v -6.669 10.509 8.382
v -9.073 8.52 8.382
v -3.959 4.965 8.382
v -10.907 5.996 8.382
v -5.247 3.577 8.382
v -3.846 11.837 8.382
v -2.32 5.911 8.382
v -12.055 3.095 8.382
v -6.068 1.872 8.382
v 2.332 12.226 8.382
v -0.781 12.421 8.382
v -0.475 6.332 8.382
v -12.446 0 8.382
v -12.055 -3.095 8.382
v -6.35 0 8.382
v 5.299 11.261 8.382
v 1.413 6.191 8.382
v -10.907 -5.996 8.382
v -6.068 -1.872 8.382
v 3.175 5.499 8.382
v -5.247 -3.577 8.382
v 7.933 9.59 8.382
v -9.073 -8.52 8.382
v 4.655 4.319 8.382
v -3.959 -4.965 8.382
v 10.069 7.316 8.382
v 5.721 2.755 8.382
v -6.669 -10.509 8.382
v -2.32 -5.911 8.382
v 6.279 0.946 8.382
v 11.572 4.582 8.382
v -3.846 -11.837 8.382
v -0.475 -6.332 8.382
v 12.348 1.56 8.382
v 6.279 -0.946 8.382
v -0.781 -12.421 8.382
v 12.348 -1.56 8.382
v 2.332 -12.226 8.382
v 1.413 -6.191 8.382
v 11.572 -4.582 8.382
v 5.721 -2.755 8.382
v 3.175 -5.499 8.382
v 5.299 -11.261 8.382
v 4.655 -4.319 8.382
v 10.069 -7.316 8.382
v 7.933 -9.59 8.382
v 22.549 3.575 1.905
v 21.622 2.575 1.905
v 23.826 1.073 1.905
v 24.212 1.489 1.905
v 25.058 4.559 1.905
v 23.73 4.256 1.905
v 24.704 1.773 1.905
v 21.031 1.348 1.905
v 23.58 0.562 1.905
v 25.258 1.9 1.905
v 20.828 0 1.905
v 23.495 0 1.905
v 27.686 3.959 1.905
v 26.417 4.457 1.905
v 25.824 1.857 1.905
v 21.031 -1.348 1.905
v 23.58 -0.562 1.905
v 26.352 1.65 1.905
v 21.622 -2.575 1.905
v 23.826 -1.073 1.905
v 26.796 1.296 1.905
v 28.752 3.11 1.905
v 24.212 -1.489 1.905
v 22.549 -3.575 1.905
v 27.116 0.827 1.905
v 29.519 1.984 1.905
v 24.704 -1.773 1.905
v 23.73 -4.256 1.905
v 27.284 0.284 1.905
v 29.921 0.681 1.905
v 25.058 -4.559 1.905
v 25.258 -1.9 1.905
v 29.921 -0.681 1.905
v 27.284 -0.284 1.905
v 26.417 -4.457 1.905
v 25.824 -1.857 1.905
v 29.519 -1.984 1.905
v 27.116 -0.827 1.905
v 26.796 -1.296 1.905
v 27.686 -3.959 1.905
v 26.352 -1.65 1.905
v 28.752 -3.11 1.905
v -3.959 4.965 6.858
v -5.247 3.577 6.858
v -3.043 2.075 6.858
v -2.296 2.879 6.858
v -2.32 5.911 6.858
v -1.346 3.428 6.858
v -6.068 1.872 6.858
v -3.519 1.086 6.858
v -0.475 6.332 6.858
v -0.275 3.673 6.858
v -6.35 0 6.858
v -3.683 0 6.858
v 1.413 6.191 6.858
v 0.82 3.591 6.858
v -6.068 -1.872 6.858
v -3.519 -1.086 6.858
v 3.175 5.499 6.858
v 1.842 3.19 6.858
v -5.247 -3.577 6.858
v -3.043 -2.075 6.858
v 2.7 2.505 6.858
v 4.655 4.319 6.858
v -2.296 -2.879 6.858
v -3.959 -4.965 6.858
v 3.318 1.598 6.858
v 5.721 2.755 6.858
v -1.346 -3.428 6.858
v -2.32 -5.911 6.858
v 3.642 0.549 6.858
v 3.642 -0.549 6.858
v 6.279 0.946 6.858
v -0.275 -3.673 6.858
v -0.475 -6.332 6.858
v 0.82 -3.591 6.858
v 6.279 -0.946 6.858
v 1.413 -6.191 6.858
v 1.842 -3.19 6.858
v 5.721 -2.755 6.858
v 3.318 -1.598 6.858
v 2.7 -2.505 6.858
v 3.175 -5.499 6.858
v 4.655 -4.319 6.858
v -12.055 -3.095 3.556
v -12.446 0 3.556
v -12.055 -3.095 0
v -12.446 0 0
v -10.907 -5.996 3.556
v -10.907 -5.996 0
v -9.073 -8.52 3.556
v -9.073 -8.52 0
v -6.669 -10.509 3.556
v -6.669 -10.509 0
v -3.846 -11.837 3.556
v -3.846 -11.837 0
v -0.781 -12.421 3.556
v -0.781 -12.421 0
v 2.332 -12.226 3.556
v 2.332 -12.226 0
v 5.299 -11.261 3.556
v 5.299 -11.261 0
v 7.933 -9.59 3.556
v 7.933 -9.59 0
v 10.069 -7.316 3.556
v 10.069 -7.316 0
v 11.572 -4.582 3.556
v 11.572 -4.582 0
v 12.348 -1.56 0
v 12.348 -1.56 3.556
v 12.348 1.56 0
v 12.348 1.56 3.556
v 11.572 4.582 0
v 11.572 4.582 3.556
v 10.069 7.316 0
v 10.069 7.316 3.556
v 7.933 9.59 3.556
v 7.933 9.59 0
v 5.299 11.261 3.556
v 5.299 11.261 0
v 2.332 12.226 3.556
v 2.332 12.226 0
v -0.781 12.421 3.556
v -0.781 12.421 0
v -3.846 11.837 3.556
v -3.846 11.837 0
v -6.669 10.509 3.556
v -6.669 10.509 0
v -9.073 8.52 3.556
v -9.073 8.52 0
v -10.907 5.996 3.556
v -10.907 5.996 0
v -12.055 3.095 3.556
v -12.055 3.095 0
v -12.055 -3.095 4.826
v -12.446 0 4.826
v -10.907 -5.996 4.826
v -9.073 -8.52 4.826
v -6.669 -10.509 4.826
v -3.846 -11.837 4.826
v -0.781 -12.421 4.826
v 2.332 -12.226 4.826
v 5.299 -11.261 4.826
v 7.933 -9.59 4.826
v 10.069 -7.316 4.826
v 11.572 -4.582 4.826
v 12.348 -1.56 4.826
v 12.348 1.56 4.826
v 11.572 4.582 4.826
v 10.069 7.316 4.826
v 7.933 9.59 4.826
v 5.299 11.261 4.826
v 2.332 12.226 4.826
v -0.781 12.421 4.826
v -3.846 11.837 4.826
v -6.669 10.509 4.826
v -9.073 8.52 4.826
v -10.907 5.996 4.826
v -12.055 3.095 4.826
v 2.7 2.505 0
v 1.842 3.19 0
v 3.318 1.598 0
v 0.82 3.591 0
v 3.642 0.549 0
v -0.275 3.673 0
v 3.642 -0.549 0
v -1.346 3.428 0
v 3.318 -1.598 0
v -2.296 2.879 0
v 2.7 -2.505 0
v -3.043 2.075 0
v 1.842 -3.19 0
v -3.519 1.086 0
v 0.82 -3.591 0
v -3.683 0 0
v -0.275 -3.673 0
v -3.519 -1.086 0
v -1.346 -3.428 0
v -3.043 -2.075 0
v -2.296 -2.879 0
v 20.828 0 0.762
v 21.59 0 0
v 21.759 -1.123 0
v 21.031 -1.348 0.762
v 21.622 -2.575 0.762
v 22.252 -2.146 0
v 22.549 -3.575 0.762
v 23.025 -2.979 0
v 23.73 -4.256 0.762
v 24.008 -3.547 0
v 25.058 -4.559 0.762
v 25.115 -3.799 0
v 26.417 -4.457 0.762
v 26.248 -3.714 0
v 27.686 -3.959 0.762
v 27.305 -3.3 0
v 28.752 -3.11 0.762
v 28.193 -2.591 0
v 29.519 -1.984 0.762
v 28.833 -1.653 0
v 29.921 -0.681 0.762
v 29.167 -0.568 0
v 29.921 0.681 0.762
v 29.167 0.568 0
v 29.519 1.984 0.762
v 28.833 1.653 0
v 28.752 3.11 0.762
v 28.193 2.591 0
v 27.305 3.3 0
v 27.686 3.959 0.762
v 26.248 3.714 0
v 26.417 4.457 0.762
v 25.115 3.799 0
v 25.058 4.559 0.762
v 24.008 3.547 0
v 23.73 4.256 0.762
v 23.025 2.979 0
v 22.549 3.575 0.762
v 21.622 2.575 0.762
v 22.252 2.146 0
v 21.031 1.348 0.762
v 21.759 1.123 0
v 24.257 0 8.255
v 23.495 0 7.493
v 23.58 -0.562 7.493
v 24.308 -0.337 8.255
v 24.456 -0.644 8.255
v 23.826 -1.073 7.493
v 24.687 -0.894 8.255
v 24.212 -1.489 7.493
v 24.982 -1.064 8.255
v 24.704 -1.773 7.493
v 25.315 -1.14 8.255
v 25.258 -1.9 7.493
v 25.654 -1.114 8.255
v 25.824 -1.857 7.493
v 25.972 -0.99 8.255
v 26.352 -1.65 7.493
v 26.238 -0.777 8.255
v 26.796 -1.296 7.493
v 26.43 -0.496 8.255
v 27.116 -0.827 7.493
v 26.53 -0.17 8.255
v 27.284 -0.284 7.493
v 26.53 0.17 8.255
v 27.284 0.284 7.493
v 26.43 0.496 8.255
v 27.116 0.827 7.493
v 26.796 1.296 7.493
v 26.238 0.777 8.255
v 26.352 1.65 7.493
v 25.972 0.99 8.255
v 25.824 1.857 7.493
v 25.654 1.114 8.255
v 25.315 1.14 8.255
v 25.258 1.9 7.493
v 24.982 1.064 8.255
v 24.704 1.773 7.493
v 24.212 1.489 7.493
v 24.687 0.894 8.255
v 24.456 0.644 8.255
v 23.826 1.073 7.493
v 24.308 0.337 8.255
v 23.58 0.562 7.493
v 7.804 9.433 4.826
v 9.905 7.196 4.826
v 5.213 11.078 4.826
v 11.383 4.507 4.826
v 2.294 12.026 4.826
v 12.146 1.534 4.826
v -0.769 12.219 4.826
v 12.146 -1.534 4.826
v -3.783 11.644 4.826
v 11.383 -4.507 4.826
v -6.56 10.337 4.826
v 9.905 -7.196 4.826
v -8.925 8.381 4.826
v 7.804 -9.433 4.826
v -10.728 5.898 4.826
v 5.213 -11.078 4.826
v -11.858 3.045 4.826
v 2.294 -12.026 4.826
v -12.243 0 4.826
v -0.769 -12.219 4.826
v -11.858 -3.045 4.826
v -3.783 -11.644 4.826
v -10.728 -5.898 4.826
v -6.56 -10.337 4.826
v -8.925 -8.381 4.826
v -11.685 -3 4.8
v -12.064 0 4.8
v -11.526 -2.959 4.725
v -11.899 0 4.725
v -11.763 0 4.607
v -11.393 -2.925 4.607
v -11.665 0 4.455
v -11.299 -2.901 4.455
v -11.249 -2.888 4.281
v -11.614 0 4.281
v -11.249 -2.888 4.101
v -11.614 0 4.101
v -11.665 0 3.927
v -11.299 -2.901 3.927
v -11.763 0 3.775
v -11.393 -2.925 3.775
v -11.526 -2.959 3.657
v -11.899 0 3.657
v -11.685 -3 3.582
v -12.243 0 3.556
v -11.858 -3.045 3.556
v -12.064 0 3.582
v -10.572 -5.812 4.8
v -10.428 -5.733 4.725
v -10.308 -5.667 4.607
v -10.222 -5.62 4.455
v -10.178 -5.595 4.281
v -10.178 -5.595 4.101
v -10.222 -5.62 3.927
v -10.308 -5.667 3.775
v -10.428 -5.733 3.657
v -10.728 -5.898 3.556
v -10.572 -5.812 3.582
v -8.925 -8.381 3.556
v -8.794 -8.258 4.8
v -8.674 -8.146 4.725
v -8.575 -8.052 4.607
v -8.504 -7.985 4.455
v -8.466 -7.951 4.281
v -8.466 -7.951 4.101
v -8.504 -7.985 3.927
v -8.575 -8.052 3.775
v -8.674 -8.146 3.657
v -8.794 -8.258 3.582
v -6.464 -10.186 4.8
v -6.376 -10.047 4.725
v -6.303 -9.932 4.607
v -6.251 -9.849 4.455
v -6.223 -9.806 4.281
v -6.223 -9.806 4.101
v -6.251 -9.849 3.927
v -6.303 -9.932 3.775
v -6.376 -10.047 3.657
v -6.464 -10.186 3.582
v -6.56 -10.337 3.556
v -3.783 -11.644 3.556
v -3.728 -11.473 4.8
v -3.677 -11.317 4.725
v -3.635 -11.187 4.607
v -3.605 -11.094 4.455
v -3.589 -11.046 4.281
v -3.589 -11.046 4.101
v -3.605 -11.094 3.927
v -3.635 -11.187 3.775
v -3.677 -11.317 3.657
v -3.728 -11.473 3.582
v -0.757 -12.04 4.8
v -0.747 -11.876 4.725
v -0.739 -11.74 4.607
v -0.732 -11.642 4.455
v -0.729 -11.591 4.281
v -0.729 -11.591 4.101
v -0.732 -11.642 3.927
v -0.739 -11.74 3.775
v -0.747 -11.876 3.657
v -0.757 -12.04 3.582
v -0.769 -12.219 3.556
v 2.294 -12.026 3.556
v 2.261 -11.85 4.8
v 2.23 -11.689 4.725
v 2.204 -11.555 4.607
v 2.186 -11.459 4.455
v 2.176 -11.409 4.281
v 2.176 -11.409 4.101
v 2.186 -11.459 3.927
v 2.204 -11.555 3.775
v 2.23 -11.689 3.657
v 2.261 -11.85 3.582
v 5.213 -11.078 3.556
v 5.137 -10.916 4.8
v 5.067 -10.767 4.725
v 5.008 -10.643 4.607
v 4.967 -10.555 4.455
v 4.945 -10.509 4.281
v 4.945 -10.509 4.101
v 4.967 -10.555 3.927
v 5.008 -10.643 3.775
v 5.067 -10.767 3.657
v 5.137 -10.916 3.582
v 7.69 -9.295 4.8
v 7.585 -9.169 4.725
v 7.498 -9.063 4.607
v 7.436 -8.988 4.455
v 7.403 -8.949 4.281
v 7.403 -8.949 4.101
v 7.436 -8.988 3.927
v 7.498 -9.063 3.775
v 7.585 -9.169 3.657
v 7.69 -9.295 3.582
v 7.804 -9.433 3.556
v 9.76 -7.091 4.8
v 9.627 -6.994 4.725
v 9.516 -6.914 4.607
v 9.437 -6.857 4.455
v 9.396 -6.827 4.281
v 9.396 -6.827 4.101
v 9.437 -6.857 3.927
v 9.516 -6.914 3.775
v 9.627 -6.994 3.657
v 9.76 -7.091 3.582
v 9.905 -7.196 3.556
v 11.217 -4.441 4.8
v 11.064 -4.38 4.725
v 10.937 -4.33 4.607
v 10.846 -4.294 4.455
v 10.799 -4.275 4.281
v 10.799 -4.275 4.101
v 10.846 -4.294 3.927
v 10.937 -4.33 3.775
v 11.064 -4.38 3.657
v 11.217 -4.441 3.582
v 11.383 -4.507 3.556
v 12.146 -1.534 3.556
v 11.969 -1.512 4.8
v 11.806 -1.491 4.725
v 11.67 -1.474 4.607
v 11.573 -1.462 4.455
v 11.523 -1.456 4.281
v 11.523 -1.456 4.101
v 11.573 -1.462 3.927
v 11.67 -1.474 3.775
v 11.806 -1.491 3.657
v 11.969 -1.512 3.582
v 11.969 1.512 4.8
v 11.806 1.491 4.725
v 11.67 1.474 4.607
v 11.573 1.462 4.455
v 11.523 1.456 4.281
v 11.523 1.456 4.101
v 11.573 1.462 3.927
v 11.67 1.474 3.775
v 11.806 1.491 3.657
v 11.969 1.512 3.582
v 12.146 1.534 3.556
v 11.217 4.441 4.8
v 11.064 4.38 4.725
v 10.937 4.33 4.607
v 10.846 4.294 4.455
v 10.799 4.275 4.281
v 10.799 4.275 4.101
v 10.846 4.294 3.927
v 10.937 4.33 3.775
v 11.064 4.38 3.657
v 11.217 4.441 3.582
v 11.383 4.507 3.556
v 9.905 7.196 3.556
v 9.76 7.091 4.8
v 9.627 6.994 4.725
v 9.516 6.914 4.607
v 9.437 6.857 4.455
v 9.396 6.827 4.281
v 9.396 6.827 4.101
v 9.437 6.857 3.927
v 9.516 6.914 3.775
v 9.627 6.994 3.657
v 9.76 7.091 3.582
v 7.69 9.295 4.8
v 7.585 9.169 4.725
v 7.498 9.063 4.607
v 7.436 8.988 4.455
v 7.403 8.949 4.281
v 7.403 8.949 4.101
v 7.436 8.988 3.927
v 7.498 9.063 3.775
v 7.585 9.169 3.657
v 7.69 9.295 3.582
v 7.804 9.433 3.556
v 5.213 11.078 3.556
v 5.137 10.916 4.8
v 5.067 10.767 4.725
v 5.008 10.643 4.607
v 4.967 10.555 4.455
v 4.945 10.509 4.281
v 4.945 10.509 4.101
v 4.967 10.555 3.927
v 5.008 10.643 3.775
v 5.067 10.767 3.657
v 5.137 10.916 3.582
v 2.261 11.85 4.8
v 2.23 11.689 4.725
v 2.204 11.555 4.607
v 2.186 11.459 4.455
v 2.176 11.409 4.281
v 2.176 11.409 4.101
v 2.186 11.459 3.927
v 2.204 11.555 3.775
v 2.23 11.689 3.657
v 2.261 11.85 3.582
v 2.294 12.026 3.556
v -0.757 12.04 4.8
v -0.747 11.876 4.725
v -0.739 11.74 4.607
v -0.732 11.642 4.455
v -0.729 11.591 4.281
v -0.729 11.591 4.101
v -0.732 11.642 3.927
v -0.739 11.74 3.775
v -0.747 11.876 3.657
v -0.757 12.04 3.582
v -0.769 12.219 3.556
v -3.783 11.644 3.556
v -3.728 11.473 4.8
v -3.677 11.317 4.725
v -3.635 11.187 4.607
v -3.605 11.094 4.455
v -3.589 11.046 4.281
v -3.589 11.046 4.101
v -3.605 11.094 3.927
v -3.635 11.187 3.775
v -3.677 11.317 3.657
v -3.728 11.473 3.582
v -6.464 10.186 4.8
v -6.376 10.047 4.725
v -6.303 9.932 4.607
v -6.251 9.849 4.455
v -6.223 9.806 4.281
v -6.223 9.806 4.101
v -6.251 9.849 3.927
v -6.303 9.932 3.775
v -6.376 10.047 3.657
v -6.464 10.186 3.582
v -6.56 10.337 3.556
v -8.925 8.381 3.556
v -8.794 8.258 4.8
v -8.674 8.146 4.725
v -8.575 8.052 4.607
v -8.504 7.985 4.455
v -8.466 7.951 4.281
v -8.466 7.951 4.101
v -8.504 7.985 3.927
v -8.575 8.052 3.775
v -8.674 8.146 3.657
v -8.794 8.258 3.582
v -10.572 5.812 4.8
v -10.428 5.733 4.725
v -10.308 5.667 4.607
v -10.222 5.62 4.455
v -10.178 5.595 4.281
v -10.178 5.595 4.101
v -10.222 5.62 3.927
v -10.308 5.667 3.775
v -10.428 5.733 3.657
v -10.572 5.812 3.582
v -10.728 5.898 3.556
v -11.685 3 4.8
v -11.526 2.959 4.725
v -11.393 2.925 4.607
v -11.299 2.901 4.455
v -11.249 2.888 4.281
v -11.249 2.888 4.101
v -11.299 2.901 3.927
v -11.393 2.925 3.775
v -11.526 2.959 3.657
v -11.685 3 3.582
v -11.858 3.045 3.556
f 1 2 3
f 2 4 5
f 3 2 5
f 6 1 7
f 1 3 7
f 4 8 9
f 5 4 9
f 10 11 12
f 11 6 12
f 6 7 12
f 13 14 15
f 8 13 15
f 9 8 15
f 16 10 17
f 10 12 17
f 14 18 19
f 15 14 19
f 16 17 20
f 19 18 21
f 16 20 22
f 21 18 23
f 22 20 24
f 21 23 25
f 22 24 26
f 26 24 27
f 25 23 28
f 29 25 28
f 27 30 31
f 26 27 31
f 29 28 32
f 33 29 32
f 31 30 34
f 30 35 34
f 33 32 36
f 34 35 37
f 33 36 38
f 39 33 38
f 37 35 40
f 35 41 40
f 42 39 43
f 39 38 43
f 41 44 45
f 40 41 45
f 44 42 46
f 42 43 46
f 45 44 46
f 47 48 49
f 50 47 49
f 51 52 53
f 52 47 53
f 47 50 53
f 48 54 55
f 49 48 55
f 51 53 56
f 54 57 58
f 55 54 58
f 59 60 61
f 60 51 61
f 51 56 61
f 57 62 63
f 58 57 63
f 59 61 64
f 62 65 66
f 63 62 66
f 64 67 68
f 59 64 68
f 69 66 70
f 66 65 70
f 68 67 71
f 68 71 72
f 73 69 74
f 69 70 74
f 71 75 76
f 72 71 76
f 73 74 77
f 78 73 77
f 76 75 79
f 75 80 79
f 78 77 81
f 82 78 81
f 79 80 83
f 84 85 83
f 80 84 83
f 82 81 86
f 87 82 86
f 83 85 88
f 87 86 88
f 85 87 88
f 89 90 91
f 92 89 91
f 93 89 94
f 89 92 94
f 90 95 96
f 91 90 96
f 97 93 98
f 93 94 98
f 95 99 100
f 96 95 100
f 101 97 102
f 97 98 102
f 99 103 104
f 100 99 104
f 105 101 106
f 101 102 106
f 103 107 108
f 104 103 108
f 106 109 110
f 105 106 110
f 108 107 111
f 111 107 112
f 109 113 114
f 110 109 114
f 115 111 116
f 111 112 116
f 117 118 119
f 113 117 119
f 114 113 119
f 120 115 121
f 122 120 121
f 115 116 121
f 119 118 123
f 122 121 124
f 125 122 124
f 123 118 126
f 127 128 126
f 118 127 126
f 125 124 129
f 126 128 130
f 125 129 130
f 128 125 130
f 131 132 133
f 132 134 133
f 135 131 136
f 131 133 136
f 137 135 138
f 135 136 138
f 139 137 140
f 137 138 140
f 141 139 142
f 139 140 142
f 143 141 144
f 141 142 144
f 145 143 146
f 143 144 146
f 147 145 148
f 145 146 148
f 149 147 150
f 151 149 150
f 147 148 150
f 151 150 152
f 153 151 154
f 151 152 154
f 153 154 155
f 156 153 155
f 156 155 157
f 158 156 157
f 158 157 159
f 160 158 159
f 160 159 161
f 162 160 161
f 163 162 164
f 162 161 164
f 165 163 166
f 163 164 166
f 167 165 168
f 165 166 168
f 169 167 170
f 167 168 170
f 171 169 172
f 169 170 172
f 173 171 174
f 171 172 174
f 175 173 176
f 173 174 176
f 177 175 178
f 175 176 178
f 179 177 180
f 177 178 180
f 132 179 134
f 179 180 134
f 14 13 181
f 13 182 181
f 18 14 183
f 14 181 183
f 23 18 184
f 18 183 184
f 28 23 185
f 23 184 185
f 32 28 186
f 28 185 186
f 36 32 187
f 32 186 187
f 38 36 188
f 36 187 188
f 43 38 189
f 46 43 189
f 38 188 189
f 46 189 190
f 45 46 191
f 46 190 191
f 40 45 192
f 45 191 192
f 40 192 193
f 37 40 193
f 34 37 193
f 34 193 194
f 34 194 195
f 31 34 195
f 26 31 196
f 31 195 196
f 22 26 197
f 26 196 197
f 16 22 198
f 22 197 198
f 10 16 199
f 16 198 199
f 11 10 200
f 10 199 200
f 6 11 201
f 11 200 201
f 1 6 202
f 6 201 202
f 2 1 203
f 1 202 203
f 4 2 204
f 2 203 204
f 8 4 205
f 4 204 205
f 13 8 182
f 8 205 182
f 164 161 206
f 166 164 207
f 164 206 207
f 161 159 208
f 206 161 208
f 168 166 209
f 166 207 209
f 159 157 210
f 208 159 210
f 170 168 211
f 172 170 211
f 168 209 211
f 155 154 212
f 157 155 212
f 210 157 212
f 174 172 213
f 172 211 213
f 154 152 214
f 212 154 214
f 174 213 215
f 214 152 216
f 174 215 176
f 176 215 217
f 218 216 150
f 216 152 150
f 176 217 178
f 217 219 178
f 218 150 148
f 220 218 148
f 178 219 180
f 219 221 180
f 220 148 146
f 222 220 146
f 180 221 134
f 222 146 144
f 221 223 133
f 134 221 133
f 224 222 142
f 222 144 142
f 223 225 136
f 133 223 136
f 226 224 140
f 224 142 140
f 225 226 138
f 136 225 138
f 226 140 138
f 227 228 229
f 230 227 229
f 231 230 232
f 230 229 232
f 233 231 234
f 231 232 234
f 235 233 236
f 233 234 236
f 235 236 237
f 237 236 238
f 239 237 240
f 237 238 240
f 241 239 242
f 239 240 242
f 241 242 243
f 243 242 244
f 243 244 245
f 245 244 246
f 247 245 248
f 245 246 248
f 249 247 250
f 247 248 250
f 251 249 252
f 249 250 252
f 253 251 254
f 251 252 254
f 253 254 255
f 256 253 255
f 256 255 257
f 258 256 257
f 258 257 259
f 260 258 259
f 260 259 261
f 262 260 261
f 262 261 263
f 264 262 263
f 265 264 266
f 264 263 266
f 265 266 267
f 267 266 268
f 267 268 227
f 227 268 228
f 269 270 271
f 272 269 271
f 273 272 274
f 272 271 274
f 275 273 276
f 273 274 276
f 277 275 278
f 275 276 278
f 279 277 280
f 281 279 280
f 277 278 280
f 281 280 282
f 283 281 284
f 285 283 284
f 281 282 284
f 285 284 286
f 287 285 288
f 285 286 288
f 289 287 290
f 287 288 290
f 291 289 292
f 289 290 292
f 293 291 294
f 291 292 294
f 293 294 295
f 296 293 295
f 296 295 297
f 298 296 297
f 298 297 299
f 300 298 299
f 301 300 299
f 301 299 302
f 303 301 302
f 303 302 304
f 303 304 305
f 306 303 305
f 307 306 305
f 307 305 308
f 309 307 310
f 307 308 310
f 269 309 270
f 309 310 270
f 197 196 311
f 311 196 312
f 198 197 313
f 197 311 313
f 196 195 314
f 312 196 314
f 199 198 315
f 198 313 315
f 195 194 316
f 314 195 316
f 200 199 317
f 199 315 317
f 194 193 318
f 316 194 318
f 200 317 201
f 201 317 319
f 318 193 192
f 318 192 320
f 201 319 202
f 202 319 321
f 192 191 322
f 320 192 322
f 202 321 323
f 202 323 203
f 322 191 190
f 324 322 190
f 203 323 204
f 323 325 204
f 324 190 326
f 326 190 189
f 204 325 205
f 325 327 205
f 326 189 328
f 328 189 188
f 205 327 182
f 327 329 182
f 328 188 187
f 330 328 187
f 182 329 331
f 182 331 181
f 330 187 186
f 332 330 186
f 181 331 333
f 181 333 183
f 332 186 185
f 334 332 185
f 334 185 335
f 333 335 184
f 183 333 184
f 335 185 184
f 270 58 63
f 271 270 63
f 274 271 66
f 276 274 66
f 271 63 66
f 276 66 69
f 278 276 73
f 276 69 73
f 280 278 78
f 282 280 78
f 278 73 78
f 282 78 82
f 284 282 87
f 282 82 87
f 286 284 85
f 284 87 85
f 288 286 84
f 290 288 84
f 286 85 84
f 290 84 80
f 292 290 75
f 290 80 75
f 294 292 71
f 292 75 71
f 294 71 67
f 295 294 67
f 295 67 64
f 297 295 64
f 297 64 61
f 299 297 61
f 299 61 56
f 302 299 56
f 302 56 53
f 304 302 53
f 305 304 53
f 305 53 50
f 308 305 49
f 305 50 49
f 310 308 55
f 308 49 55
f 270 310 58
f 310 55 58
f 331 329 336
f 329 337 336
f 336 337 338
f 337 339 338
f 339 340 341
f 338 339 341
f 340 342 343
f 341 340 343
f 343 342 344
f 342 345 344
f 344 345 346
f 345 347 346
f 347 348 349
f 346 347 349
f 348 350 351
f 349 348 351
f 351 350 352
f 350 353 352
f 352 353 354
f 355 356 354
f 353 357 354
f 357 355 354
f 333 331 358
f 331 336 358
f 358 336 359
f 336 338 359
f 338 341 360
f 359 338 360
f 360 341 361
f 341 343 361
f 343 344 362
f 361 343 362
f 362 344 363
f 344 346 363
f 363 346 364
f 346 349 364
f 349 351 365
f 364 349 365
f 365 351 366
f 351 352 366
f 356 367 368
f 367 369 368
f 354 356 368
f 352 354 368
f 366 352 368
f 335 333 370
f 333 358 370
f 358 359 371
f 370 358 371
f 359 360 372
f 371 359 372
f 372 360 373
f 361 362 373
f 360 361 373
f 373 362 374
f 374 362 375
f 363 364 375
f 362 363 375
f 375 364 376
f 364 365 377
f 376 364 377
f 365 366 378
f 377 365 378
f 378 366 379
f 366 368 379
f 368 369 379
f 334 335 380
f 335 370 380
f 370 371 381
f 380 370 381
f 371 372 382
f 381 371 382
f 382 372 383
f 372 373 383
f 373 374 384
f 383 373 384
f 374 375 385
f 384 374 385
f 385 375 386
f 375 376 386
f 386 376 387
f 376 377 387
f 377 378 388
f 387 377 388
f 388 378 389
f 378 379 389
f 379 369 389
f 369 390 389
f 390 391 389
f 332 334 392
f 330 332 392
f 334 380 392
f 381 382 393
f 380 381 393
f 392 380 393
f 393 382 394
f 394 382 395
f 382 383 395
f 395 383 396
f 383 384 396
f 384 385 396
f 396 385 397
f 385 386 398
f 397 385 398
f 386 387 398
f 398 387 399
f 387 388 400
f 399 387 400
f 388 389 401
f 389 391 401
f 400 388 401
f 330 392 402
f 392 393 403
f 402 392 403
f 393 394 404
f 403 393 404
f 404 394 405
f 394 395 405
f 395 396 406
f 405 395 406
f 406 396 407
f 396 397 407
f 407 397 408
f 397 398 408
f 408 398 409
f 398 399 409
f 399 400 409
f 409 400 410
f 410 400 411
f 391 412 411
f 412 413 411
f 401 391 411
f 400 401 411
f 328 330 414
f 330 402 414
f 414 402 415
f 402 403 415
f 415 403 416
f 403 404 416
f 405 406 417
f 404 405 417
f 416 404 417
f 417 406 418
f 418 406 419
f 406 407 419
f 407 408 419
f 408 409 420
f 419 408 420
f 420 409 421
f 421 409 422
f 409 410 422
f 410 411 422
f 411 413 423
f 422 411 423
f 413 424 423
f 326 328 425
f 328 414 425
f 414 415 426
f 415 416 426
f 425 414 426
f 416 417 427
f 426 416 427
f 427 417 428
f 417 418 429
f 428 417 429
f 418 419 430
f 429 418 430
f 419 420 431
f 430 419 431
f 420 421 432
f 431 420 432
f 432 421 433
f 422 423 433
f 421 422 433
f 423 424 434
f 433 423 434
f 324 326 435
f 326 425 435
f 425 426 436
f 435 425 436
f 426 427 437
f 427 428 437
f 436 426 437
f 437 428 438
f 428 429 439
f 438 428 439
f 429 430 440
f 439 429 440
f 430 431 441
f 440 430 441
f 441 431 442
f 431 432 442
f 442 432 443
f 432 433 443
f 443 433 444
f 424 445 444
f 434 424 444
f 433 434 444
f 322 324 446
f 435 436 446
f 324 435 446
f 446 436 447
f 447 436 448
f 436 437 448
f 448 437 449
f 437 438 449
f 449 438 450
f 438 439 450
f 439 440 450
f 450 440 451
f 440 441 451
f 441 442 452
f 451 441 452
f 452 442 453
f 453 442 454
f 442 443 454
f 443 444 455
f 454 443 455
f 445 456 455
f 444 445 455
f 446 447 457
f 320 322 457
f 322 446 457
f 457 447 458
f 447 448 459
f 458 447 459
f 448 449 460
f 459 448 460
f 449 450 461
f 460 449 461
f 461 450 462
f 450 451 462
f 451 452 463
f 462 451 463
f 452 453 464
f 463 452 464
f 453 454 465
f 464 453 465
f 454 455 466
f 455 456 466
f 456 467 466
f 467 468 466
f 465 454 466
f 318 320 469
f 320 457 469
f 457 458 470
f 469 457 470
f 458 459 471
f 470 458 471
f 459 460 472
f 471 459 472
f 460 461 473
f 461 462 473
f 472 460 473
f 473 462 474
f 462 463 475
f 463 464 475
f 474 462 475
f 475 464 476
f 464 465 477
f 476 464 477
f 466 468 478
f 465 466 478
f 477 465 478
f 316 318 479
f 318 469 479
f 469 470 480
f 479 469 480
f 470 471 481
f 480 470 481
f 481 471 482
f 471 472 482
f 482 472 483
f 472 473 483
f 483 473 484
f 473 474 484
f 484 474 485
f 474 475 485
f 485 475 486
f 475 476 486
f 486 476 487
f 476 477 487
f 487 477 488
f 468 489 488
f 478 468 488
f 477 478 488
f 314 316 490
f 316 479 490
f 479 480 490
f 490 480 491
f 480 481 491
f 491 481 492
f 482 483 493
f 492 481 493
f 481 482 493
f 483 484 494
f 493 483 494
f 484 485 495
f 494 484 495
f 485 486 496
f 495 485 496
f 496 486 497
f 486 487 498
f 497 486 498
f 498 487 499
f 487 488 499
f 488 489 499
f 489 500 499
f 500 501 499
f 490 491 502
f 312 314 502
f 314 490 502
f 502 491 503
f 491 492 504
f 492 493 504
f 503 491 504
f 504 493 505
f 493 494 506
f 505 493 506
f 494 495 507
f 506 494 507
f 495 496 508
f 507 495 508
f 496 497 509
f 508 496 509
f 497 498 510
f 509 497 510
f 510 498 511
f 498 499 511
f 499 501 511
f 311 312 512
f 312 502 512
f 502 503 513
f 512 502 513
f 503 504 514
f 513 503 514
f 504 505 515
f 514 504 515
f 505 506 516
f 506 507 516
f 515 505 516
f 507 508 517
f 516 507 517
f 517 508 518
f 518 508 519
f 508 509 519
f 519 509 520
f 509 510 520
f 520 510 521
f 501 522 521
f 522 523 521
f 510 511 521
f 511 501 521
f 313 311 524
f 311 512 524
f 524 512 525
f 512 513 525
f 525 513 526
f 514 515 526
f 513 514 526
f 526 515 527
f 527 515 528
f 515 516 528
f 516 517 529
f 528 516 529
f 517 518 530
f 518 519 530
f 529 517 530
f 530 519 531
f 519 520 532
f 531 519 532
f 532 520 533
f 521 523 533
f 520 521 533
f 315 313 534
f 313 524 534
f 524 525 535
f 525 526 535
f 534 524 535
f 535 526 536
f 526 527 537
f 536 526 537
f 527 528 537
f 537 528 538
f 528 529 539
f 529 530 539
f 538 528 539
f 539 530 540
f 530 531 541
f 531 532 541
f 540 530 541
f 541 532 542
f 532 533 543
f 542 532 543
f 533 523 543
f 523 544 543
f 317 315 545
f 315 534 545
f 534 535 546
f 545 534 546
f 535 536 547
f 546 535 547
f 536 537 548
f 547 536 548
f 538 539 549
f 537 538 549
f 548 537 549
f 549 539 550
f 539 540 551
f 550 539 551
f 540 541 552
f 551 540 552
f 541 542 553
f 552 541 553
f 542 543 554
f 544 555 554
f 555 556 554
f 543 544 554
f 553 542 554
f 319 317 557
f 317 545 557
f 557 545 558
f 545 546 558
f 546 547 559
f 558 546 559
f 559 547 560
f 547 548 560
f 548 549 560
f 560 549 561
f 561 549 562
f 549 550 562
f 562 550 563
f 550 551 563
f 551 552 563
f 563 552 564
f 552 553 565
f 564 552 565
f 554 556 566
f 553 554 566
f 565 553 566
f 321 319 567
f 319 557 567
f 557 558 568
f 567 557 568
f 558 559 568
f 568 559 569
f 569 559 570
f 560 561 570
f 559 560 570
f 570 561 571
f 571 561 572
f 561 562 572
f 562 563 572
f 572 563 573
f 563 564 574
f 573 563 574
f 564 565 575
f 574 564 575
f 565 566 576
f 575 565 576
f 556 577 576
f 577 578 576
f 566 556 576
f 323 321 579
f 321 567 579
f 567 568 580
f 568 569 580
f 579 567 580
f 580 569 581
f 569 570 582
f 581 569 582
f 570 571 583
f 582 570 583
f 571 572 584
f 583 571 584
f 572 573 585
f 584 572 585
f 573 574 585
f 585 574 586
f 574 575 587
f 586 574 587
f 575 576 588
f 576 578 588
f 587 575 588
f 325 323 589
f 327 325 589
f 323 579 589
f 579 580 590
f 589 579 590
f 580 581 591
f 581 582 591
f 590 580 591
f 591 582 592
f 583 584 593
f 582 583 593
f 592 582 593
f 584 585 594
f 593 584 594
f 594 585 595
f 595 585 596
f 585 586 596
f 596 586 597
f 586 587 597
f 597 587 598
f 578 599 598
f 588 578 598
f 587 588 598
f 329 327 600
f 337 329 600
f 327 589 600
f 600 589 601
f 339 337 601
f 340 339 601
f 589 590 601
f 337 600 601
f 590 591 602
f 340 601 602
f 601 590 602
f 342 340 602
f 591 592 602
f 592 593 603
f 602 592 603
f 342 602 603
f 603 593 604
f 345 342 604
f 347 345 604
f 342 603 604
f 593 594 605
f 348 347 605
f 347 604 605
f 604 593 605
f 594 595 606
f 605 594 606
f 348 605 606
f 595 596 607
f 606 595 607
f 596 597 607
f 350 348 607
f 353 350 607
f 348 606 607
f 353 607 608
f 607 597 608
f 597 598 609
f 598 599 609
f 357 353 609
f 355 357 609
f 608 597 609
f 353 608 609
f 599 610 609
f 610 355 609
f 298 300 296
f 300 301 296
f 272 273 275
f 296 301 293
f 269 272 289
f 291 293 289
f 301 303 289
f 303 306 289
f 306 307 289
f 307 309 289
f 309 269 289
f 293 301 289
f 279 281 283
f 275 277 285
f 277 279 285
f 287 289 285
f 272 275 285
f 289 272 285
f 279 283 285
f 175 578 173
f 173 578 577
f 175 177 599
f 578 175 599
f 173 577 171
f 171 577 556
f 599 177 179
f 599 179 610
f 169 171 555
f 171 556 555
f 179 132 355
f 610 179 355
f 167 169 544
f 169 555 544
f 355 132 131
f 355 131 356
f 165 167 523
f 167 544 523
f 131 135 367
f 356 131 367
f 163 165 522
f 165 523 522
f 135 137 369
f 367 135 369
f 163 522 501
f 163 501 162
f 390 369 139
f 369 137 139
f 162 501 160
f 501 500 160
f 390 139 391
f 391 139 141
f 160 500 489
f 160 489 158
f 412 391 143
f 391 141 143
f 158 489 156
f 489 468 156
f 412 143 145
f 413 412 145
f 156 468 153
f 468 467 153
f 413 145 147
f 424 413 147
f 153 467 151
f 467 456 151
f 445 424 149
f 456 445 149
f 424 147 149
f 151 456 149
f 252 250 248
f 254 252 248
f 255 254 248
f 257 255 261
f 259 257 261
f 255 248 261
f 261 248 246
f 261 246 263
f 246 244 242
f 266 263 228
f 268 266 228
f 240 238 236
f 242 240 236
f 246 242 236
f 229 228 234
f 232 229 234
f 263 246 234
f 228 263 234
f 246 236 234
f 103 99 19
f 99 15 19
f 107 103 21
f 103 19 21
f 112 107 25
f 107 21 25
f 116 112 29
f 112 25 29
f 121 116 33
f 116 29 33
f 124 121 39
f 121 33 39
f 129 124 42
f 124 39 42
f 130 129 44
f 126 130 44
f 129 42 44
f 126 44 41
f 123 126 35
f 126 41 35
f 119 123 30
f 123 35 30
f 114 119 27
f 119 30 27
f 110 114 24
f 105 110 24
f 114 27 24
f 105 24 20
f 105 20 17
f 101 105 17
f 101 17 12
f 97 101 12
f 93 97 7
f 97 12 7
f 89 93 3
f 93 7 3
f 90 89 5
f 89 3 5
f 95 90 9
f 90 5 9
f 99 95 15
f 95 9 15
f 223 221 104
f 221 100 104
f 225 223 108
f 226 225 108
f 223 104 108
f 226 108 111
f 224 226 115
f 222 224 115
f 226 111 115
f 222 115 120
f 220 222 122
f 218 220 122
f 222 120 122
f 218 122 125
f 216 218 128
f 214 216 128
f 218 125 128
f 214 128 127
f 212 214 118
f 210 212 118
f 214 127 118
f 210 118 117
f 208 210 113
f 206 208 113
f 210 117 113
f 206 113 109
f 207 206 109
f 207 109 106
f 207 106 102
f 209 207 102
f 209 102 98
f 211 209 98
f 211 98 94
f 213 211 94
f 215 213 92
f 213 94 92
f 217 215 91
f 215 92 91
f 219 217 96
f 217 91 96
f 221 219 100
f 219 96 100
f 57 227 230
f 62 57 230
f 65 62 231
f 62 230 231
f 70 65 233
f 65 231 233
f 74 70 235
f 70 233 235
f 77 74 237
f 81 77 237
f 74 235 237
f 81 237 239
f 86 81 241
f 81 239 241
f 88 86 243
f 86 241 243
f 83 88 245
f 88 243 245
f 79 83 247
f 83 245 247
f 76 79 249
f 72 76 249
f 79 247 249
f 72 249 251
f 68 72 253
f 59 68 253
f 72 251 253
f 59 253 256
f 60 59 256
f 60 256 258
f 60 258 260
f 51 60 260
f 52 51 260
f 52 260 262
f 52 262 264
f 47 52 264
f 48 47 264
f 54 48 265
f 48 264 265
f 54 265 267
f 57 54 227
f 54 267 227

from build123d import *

# Parameters (mm, degrees)
F4_SIZE = 0.762


with BuildPart() as f2:
    # F0 (on Front) → F2 (revolve)
    with BuildSketch(Plane.XZ):
        with BuildLine():
            Line((-12.446, 0), (-3.683, 0))
            Line((-3.683, 0), (-3.683, 6.858))
            Line((-3.683, 6.858), (-6.35, 6.858))
            Line((-6.35, 6.858), (-6.35, 8.382))
            Line((-6.35, 8.382), (-12.446, 8.382))
            Line((-12.446, 8.382), (-12.446, 4.826))
            Line((-12.446, 4.826), (-12.2428, 4.826))
            ThreePointArc((-12.2428, 4.826), (-11.6078, 4.191), (-12.2428, 3.556))
            Line((-12.2428, 3.556), (-12.446, 3.556))
            Line((-12.446, 3.556), (-12.446, 0))
        make_face()
    revolve(axis=Axis((0, 0, 8.2818850817), (0, 0, 1)))


with BuildPart() as f3:
    # F1 (on Front) → F3 (revolve)
    with BuildSketch(Plane.XZ):
        Polygon((20.828, 1.905), (20.828, 0), (25.4, 0), (25.4, 8.255), (23.495, 8.255), (23.495, 1.905), align=None)
    revolve(axis=Axis((25.4, 0, 4.1275), (0, 0, 1)))

    # F4
    f4_edges = [f3.edges().sort_by_distance(p)[0] for p in [
        (27.305, 0, 8.255),
        (29.972, 0, 0),
    ]]
    chamfer(f4_edges, length=F4_SIZE)


solid = Compound([f2.part, f3.part])
